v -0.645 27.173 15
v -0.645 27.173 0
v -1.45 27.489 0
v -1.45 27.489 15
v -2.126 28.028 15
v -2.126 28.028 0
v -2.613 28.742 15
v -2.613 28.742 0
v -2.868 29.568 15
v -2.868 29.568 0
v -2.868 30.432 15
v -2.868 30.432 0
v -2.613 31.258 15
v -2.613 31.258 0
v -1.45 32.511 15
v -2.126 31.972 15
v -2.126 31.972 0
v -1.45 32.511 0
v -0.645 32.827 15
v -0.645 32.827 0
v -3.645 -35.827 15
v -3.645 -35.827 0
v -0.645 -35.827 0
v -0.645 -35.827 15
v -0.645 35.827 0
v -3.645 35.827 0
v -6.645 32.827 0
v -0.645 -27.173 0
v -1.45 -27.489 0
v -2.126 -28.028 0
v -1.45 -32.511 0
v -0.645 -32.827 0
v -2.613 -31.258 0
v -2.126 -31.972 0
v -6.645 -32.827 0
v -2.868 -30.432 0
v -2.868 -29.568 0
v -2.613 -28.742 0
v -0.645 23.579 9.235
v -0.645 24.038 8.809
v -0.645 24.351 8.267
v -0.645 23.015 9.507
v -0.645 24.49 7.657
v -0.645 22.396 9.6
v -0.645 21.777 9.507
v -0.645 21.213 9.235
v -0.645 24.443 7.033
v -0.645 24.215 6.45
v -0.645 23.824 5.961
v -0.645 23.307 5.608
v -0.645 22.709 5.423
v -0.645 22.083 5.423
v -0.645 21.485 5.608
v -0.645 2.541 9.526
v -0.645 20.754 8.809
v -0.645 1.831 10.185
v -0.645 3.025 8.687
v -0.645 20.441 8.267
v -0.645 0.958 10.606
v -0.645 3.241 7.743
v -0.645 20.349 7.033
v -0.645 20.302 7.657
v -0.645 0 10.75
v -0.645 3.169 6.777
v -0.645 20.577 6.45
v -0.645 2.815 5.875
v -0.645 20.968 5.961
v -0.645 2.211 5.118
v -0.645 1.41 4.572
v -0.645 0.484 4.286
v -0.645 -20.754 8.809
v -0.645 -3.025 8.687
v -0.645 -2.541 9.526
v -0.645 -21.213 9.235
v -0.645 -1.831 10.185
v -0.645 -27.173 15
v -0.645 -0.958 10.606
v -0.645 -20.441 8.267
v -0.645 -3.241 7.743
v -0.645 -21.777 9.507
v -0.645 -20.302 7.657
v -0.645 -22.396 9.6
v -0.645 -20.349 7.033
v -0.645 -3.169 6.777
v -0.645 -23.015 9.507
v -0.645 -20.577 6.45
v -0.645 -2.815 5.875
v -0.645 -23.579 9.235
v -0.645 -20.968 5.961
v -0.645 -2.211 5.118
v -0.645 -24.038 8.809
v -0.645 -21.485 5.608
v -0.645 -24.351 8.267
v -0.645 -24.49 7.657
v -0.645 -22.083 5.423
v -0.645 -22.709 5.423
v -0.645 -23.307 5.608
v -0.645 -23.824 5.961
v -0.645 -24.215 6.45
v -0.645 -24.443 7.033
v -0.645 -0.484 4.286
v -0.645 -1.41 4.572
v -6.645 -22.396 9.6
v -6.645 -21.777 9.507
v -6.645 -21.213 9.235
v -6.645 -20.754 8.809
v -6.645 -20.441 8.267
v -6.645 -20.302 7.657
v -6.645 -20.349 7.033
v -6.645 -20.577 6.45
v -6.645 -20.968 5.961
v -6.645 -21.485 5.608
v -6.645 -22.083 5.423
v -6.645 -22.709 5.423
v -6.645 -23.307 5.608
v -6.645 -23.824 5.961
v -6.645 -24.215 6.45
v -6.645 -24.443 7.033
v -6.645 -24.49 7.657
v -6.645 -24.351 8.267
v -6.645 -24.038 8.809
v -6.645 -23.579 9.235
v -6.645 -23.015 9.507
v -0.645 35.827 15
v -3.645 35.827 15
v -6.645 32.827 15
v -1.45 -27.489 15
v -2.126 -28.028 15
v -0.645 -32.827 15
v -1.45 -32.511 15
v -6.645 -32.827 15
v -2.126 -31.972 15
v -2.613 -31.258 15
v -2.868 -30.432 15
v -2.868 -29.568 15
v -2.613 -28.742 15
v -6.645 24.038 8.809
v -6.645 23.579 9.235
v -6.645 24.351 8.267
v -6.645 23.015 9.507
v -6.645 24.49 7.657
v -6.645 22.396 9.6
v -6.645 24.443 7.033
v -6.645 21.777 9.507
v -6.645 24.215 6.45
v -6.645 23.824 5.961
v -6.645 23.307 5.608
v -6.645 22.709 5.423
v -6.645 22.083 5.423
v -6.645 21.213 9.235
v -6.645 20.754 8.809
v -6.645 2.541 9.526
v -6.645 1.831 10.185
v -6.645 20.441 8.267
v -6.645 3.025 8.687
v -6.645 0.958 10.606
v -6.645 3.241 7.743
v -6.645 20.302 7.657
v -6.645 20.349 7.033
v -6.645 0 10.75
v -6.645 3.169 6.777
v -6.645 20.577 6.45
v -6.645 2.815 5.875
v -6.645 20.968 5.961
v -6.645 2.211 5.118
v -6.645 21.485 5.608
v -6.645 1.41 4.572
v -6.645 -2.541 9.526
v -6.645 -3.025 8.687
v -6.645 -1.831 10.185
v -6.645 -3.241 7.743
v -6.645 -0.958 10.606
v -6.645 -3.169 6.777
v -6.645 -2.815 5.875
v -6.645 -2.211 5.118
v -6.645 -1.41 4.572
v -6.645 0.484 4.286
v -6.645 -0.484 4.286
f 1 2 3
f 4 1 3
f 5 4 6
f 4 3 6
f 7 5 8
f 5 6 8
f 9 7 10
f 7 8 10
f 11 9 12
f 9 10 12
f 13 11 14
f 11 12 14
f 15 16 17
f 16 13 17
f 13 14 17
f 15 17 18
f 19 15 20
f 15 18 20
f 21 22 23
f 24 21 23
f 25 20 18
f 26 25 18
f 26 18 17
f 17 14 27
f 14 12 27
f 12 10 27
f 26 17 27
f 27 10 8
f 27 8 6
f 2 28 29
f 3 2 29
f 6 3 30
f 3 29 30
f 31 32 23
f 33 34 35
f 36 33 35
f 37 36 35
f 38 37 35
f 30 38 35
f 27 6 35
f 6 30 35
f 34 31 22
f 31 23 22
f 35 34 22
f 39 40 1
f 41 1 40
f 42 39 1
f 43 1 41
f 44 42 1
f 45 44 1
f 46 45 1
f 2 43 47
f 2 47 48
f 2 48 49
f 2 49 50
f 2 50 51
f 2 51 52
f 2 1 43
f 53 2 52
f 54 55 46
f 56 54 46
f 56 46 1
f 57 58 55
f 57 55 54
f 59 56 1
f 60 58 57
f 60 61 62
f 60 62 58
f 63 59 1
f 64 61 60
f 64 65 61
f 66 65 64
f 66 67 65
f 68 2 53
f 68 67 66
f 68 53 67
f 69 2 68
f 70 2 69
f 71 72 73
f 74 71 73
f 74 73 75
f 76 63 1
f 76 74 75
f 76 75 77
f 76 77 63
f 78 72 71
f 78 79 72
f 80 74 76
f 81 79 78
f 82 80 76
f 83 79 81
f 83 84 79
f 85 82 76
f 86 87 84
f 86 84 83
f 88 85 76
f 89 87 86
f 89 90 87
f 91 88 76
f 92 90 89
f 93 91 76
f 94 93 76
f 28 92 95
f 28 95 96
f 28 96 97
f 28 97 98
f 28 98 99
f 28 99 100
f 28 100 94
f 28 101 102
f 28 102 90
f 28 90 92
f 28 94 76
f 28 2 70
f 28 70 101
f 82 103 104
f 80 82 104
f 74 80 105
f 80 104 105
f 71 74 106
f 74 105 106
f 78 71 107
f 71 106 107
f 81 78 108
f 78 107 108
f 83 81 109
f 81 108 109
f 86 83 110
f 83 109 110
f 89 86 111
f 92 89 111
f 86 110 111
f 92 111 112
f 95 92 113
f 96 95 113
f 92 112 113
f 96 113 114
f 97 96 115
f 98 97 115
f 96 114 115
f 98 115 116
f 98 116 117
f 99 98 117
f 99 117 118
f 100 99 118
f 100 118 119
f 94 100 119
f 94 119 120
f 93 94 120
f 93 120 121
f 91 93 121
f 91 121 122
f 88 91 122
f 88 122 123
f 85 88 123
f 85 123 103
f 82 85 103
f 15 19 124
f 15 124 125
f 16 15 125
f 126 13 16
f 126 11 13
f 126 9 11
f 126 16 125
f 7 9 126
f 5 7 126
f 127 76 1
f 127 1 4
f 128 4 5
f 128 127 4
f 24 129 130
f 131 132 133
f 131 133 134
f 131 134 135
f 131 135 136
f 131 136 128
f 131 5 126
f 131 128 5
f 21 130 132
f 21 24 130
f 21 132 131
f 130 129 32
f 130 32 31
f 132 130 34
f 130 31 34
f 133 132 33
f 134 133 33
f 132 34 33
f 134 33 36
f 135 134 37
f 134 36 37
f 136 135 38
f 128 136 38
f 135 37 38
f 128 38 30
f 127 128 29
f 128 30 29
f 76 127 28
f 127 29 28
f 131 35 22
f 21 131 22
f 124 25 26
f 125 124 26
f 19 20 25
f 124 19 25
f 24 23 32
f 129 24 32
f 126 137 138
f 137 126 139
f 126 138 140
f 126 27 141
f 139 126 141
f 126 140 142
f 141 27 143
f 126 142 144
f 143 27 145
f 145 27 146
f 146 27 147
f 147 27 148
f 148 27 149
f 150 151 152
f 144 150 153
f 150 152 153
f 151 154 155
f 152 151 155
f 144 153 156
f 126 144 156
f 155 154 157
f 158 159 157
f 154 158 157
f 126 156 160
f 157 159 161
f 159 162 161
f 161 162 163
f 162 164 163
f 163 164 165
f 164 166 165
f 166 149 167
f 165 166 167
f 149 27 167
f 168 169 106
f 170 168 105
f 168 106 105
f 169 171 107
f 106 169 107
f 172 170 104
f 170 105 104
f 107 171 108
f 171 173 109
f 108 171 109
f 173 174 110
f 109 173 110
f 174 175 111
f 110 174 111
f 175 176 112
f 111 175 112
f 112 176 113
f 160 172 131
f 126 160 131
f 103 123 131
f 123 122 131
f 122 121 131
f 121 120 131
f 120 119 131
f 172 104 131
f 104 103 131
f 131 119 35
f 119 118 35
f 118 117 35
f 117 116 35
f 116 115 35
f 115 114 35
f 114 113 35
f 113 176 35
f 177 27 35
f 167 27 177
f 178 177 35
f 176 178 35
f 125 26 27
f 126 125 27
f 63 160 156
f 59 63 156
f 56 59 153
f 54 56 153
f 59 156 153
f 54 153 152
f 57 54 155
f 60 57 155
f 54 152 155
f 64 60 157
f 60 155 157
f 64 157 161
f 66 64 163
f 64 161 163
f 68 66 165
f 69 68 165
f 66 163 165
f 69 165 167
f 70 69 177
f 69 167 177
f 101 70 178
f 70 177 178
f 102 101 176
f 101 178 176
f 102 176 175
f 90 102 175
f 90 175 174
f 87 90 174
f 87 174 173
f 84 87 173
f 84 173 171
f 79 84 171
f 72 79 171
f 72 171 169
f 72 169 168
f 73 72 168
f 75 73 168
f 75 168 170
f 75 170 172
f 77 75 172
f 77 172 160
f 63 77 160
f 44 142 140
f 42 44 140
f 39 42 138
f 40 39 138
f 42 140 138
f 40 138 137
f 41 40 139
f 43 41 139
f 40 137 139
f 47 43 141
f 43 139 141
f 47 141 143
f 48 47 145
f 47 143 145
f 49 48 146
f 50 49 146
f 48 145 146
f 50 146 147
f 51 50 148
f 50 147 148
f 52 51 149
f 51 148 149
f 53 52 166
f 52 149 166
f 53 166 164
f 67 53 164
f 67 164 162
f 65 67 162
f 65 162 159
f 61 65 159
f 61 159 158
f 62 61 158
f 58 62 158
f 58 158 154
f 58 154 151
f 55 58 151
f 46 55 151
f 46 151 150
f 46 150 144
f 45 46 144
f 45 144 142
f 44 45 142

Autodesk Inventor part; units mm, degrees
ref_plane "YZ Plane" through (0, 0, 0) normal (1, 0, 0) x (0, 1, 0)
ref_plane "XZ Plane" through (0, 0, 0) normal (0, 1, 0) x (-1, 0, 0)
ref_plane "XY Plane" through (0, 0, 0) normal (0, 0, 1) x (1, 0, 0)
sketch "Szkic1" plane through (0, 0, 0) normal (0, 0, 1) x (1, 0, 0)
  circle A0 centre (0, 30) radius 3 construction
  arc A1 (-0.6454, 32.8273) -> (-0.6454, 27.1727) centre (0, 30) ccw
  line L0 (-0.6454, 27.1727) -> (-0.6454, 0)
  line L1 (-0.6454, 32.8273) -> (-0.6454, 35.8273)
  line L2 (-0.6454, 35.8273) -> (-3.6454, 35.8273)
  line L3 (-3.6454, 35.8273) -> (-6.6454, 32.8273)
  line L4 (-6.6454, 32.8273) -> (-6.6454, 0)
  line L5 (-0.6454, 0) -> (-6.6454, 0)
  point P0 (0, 0)
  dimension "d0" = 6
  dimension "d1" = 30
  dimension "d2" = 5.8
  dimension "d3" = 3
  dimension "d4" = 45
  dimension "d5" = 3
  dimension "d6" = 3
extrude "Wyciągnięcie proste1" add sketch "Szkic1" along normal blind 15
sketch "Szkic2" plane through (-6.6454, 0, 0) normal (-1, 0, 0) x (0, 0, 1)
  circle A0 centre (7.5, 22.3961) radius 2.1
  line L0 (0, 32.8273) -> (15, 32.8273) projected
  point P0 (0, 0)
  point P1 (7.5, 32.8273)
  dimension "d9" = 4.2
extrude "Wyciągnięcie proste2" cut sketch "Szkic2" against normal blind 8
mirror "Odbij1" about plane through (-6.6454, 0, 0) normal (0, -1, 0) of "Wyciągnięcie proste1", "Wyciągnięcie proste2"
sketch "Szkic3" plane through (-6.6454, 32.8273, 0) normal (-1, 0, 0) x (0, 0, 1)
  circle A0 centre (7.5, -32.8273) radius 3.25
  line L0 (0, 3) -> (15, 3) projected
  line L1 (0, 0) -> (0, -65.6545) projected
  point P0 (0, -32.8273)
  point P1 (7.5, 3)
  point P2 (0, -32.8273)
  point P3 (0, -32.8273)
  dimension "d12" = 6.5
extrude "Wyciągnięcie proste3" cut sketch "Szkic3" against normal through all
properties part number "6xMounting_clamp"
